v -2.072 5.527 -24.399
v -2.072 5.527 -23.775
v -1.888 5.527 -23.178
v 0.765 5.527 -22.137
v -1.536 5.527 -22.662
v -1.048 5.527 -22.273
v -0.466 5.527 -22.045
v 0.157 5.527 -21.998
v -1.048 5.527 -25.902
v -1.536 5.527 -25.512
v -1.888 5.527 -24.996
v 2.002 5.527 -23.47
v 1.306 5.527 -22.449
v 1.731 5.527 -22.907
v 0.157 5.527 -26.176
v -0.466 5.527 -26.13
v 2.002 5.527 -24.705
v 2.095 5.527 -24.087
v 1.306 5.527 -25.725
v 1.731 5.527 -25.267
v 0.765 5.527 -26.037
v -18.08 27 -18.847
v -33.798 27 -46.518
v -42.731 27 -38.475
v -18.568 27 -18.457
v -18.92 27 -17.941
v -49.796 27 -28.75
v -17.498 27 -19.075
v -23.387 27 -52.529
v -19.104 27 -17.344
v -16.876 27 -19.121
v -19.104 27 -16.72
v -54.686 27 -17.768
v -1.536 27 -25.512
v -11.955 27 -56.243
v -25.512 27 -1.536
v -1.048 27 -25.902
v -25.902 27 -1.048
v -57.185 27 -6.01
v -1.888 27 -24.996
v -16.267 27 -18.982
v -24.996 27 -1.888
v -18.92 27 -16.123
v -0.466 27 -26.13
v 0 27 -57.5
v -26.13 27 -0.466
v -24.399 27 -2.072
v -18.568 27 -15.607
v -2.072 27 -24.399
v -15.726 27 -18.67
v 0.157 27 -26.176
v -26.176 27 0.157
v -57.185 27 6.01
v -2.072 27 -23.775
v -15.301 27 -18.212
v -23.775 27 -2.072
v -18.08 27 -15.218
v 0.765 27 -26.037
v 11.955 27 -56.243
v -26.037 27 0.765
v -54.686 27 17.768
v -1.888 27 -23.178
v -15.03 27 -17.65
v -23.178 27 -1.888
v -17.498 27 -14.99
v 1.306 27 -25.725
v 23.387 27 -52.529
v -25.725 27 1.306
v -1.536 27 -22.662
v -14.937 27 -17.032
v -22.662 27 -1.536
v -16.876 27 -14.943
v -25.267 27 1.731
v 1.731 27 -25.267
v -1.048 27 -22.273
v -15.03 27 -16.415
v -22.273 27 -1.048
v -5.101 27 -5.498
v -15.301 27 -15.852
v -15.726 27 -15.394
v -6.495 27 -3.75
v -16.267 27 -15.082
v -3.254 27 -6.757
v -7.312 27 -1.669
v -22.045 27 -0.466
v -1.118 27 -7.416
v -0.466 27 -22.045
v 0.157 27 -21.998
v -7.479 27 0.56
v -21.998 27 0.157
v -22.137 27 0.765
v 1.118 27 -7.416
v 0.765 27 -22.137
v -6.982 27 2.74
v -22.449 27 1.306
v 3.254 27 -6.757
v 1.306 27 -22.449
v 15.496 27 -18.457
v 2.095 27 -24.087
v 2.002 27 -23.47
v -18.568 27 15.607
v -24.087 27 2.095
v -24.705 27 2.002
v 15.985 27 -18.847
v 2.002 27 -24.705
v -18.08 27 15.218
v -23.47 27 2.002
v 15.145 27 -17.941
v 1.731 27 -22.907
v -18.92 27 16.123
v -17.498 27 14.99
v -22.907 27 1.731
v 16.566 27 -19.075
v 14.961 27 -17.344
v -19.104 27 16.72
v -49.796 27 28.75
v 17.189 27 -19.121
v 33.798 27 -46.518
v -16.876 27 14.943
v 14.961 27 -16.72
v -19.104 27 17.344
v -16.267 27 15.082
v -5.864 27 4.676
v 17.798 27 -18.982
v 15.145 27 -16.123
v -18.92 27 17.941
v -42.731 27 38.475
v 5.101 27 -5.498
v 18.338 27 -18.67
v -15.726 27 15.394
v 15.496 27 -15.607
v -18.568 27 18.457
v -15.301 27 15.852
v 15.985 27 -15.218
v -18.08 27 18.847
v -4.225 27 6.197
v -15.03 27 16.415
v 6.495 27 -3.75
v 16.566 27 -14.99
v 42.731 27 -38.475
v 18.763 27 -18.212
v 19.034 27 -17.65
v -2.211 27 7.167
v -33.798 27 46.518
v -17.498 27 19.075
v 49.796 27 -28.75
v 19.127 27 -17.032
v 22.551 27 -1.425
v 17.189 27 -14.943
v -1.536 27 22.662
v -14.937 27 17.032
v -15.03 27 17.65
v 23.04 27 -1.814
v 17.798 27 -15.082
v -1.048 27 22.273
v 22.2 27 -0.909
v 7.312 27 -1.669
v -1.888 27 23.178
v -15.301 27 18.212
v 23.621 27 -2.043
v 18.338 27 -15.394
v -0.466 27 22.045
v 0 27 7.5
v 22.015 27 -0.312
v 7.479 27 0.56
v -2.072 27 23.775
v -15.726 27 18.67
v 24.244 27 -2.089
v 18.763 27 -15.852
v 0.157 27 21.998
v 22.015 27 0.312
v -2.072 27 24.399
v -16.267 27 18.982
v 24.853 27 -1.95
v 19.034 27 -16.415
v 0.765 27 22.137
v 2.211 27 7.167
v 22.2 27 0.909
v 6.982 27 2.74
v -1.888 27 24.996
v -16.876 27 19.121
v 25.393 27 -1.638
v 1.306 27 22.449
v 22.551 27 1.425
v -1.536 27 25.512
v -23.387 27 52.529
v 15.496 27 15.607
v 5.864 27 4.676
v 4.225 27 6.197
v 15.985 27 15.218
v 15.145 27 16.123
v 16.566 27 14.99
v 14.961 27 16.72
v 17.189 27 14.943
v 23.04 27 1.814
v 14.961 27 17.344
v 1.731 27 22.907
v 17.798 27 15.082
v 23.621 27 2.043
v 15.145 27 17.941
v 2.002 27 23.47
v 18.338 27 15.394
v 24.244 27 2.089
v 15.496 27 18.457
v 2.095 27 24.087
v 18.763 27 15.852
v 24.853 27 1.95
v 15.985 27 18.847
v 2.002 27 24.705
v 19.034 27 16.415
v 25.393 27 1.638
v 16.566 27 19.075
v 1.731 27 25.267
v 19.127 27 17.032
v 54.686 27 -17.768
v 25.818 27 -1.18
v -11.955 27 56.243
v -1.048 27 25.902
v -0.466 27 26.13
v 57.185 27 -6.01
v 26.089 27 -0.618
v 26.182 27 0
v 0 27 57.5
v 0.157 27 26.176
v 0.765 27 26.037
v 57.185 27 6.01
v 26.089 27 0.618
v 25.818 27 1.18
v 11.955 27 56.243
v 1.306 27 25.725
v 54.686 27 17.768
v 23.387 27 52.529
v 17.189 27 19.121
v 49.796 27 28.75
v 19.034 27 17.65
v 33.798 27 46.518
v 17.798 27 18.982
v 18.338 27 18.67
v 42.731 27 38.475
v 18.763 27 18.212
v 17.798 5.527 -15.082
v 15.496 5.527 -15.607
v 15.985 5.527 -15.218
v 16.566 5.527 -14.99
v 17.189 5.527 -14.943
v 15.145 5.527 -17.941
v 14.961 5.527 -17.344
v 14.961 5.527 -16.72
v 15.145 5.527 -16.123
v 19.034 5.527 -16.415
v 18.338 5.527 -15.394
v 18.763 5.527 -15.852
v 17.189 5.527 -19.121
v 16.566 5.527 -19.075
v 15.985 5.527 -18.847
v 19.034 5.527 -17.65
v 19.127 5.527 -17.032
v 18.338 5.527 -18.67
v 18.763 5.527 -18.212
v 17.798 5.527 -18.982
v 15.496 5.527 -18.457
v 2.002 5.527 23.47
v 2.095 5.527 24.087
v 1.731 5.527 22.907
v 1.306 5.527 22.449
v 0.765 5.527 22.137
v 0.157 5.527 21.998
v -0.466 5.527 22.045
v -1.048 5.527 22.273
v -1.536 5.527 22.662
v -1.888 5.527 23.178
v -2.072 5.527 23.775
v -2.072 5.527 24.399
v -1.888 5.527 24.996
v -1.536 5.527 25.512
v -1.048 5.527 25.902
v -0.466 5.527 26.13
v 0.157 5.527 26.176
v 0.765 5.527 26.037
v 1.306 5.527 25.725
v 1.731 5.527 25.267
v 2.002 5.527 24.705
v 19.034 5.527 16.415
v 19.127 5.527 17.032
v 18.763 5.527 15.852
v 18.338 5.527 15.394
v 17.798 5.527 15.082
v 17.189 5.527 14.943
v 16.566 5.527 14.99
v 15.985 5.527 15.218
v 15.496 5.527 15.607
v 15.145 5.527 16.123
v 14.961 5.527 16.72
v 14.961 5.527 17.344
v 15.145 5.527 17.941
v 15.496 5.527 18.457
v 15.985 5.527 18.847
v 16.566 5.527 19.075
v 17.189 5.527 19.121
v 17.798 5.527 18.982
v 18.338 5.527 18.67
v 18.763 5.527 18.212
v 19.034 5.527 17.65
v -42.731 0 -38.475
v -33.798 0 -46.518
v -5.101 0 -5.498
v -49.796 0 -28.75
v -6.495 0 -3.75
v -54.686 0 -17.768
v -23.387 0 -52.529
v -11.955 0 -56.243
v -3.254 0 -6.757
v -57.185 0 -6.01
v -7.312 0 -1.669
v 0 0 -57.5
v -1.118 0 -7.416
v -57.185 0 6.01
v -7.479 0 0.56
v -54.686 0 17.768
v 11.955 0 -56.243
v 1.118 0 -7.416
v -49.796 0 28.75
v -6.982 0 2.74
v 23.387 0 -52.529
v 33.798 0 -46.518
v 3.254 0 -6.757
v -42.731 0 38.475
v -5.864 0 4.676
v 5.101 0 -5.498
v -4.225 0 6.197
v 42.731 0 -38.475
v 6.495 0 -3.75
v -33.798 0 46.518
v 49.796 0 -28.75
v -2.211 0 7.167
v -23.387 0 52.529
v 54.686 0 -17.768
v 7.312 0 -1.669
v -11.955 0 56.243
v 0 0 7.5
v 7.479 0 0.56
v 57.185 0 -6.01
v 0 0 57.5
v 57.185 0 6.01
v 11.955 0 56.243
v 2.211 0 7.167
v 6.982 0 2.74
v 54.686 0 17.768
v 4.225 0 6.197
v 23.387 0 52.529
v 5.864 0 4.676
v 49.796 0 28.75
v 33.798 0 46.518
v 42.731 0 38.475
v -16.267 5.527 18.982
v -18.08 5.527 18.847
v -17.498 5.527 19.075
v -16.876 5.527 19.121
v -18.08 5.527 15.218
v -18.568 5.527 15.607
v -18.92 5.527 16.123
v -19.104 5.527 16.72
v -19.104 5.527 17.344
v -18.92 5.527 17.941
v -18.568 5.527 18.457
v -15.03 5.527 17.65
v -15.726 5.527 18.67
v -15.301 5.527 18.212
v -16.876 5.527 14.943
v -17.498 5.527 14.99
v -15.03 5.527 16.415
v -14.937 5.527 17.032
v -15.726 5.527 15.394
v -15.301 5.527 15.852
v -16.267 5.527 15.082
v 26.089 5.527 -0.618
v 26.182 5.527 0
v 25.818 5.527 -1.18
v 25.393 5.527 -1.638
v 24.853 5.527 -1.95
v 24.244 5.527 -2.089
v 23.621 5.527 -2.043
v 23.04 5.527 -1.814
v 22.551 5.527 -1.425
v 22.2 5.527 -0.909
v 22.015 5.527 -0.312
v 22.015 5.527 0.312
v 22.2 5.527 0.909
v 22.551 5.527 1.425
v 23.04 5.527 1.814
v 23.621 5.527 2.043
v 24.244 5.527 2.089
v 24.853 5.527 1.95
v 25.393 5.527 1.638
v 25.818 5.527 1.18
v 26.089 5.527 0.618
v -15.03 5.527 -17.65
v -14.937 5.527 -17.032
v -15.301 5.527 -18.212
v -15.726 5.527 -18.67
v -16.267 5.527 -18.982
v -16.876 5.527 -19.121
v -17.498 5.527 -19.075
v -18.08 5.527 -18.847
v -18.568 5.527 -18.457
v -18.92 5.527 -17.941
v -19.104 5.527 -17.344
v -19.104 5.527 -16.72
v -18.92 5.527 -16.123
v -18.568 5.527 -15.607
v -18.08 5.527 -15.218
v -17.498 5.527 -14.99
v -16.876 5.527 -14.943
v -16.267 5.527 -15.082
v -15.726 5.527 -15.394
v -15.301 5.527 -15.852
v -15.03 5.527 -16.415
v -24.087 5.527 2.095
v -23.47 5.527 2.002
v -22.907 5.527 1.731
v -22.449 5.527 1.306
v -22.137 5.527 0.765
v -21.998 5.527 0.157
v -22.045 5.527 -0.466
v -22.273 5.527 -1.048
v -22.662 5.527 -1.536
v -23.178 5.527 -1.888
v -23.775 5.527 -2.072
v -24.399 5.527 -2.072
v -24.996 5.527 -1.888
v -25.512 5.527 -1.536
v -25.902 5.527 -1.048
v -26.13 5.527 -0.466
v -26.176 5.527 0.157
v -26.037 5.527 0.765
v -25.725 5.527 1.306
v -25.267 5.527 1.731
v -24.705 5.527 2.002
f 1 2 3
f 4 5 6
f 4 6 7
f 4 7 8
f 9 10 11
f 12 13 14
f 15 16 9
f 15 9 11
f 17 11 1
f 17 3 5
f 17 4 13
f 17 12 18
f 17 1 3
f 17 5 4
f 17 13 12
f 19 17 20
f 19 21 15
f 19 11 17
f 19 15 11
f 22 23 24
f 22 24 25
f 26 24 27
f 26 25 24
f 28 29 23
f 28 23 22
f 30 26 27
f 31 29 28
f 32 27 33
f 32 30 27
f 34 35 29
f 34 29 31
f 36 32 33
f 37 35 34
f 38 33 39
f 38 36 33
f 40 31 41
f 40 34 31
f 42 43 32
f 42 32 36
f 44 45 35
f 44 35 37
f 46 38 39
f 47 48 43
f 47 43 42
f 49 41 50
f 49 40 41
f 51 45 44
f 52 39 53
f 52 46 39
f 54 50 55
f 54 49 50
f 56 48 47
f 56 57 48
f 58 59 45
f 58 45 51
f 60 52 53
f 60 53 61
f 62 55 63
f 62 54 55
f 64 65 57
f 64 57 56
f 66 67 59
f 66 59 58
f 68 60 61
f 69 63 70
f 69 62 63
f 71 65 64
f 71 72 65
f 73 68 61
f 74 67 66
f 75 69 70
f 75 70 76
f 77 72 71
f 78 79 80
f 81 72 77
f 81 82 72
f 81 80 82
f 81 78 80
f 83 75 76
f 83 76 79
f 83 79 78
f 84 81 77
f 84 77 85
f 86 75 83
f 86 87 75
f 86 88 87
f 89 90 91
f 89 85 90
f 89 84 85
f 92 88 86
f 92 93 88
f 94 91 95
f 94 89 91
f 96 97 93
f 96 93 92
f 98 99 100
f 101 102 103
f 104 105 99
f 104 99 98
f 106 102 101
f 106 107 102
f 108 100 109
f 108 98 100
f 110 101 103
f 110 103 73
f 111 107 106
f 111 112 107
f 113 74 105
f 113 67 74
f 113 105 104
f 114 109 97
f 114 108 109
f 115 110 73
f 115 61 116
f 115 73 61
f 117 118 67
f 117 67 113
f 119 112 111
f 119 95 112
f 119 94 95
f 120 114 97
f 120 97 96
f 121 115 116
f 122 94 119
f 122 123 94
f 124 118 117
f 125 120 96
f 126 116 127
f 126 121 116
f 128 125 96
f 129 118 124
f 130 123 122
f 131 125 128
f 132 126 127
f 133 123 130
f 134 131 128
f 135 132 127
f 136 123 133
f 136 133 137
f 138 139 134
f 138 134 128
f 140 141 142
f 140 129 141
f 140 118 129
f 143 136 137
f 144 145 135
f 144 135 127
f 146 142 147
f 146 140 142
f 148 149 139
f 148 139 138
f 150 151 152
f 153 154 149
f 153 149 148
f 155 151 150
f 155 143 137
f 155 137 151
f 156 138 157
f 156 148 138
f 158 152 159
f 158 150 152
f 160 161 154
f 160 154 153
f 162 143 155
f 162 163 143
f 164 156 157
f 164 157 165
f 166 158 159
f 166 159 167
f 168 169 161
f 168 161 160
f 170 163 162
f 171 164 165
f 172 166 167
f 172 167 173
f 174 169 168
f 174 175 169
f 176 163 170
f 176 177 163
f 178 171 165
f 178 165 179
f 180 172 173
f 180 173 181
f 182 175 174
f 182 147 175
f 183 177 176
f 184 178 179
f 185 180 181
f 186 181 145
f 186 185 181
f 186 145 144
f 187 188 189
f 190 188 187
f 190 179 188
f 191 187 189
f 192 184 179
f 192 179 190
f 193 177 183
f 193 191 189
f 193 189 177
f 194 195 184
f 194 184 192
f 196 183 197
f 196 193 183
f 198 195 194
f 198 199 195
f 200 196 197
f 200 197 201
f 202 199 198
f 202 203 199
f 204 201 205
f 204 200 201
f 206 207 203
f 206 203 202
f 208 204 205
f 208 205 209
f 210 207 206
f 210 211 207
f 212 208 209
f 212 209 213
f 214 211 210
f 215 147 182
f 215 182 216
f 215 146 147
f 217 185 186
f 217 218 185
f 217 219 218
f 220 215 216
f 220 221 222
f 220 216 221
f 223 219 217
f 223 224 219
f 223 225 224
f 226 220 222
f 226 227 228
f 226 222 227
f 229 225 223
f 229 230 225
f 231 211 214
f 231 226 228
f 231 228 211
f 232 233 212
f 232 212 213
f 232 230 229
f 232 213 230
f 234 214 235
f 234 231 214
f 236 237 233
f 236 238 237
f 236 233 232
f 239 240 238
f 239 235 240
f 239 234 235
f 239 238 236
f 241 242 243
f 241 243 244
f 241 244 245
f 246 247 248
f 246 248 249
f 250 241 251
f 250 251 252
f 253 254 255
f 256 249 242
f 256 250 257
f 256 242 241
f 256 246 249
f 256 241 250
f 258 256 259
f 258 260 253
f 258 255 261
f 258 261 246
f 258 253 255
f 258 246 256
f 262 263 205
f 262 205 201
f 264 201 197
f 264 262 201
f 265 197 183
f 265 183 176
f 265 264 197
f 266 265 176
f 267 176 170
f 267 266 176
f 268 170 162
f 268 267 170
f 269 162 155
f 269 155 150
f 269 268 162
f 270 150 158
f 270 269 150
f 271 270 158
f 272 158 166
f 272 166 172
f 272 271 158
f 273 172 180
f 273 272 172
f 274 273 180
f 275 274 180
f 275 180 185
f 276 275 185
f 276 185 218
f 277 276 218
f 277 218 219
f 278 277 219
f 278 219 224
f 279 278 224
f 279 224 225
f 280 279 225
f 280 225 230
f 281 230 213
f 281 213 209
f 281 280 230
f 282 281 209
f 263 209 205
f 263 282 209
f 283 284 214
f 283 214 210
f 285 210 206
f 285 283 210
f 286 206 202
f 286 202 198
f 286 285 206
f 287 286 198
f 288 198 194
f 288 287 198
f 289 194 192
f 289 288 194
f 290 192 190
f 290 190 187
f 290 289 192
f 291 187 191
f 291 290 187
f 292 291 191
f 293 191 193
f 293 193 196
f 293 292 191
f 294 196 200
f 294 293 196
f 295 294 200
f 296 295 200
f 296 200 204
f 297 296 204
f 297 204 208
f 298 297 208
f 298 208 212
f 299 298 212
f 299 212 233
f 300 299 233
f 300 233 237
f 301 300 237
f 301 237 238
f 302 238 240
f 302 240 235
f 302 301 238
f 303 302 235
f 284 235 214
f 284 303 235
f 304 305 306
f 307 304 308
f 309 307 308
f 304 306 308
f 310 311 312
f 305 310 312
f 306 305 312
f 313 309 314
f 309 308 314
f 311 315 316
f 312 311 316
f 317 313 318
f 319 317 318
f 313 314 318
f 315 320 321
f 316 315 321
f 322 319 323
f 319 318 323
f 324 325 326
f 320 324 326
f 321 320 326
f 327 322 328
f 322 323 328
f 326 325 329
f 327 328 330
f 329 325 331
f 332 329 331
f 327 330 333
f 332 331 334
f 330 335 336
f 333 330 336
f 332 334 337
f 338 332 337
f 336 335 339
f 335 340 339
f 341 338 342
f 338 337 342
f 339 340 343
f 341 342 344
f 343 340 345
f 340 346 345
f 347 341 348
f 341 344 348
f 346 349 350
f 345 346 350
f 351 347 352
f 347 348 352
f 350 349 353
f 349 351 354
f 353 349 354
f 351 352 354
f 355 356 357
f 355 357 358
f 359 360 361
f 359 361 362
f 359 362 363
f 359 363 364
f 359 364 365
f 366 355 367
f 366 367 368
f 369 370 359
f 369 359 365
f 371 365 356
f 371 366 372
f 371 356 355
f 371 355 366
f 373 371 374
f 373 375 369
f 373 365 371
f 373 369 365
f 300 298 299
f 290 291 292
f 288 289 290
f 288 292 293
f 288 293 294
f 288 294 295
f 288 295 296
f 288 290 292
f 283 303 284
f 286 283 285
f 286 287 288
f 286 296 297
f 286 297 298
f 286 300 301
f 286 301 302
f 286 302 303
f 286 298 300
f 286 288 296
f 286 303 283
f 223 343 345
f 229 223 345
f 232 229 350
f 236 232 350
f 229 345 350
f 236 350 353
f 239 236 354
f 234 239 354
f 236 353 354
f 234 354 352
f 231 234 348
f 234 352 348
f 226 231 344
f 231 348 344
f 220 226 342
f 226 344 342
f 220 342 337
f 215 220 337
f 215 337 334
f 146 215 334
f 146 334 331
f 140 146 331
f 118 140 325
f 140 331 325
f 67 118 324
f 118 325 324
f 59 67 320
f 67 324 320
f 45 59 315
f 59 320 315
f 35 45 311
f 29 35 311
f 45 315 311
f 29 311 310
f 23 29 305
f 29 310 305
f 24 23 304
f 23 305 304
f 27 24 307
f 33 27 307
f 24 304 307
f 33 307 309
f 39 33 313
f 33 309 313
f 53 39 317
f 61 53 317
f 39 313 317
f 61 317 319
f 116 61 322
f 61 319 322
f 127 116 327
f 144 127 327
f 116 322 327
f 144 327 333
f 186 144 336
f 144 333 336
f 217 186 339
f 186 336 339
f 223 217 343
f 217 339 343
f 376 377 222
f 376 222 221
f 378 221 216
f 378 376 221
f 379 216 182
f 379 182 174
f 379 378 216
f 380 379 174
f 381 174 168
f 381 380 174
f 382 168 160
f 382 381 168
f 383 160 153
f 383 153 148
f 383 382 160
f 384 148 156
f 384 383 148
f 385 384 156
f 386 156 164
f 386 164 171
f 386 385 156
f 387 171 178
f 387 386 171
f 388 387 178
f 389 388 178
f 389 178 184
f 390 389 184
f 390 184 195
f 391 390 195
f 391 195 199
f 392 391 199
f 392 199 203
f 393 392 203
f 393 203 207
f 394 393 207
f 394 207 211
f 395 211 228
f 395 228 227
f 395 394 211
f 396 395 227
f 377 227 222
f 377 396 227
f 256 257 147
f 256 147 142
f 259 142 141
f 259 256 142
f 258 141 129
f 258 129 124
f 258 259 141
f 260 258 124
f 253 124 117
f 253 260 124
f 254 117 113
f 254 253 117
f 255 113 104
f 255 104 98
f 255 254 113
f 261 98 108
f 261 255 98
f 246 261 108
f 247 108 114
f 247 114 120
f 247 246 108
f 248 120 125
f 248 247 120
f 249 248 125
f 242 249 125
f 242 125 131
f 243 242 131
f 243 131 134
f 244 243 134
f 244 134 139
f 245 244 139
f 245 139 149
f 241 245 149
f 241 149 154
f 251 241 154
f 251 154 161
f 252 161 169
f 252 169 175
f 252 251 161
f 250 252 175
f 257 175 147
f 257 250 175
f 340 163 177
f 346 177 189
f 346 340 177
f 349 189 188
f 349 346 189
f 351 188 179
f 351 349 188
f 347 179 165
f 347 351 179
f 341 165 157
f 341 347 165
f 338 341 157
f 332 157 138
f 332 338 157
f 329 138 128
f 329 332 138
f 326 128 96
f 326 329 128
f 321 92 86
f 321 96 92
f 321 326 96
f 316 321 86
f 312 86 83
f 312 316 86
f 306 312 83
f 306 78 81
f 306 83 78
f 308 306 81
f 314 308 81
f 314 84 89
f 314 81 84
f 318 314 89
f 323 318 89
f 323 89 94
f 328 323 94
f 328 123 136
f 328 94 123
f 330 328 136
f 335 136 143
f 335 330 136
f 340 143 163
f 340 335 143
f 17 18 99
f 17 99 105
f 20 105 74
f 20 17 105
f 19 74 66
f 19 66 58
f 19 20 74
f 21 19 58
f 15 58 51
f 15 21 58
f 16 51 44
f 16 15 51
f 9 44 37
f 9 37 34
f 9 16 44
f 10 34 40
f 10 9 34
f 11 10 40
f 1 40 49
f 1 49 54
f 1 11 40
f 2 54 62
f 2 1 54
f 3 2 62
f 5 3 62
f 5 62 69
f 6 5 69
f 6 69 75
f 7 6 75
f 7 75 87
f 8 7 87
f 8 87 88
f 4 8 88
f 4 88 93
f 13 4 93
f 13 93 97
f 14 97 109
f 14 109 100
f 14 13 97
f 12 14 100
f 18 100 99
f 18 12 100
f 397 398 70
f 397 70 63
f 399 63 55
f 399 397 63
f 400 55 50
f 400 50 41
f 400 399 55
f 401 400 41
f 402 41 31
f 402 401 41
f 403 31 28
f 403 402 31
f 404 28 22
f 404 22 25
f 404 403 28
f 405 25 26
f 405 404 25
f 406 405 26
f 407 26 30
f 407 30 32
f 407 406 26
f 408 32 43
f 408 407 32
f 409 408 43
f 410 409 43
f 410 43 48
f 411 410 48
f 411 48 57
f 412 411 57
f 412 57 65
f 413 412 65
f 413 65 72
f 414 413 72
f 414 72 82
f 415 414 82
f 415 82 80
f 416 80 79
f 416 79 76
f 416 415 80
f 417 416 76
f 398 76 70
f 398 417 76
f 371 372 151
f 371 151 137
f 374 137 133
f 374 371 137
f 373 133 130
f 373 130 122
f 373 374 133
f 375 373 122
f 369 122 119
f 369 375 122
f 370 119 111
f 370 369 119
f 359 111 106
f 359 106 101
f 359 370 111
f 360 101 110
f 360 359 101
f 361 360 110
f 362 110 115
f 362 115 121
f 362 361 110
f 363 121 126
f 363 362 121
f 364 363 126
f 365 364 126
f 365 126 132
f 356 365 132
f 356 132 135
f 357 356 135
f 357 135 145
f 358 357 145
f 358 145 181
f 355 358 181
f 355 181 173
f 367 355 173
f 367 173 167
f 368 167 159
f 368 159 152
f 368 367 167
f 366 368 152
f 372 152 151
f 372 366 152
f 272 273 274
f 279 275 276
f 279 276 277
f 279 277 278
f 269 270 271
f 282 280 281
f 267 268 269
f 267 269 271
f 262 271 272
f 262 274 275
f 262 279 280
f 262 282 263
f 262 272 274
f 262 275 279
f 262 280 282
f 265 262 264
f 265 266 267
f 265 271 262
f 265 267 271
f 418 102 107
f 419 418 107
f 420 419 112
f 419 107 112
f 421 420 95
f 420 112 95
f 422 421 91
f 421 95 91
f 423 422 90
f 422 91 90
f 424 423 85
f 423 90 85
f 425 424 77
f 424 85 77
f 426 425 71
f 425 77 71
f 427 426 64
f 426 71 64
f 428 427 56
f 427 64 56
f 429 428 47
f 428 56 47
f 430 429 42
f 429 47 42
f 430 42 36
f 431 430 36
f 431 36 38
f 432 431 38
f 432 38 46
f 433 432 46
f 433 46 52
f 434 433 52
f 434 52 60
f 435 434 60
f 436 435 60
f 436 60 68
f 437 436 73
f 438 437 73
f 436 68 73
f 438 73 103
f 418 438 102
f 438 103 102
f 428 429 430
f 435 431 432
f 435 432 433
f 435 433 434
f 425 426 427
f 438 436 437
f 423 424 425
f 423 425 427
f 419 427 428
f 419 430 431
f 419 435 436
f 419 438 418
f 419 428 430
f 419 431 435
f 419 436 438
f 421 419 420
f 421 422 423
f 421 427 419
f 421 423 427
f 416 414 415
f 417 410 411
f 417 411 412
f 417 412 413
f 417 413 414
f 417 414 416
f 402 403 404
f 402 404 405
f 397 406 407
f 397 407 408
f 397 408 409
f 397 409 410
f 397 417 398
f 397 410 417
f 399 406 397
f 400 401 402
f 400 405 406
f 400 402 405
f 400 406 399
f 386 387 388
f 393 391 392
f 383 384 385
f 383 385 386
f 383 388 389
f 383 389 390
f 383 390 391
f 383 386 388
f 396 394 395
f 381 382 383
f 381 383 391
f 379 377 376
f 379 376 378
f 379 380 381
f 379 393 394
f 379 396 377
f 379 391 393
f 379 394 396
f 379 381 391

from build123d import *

# Parameters (mm, degrees)
SKETCH1_R           = 57.5
BOSS_EXTRUDE1_DEPTH = 27
SKETCH2_R           = 7.5
CUT_EXTRUDE1_DEPTH  = 86.68255365
SKETCH3_R           = 2.0950865
CUT_EXTRUDE2_DEPTH  = 21.472569349
CIRPATTERN1_COUNT   = 8


with BuildPart() as part:
    # Sketch1 → Boss-Extrude1 (new body)
    with BuildSketch(Plane(origin=(0, 0, 0), x_dir=(1, 0, 0), z_dir=(0, 1, 0))):
        Circle(SKETCH1_R)
    extrude(amount=BOSS_EXTRUDE1_DEPTH)

    # Sketch2 → Cut-Extrude1 (cut, through all)
    with BuildSketch(Plane(origin=(0, 0, 0), x_dir=(1, 0, 0), z_dir=(0, 1, 0))):
        Circle(SKETCH2_R)
    extrude(amount=CUT_EXTRUDE1_DEPTH, mode=Mode.SUBTRACT)

    # Sketch3 → Cut-Extrude2 (cut)
    with BuildSketch(Plane(origin=(0, 27, 0), x_dir=(1, 0, 0), z_dir=(0, 1, 0))):
        with Locations((-24.087177083, 0)):
            Circle(SKETCH3_R)
    cut_extrude2 = extrude(amount=-CUT_EXTRUDE2_DEPTH, mode=Mode.SUBTRACT)

    # CirPattern1: Cut-Extrude2 ×8 about axis
    cirpattern1_axis = Axis((0, 0, 0), (0, 1, 0))
    for i in range(1, CIRPATTERN1_COUNT):
        add(cut_extrude2.rotate(cirpattern1_axis, i * 360 / CIRPATTERN1_COUNT), mode=Mode.SUBTRACT)


solid = part.part
